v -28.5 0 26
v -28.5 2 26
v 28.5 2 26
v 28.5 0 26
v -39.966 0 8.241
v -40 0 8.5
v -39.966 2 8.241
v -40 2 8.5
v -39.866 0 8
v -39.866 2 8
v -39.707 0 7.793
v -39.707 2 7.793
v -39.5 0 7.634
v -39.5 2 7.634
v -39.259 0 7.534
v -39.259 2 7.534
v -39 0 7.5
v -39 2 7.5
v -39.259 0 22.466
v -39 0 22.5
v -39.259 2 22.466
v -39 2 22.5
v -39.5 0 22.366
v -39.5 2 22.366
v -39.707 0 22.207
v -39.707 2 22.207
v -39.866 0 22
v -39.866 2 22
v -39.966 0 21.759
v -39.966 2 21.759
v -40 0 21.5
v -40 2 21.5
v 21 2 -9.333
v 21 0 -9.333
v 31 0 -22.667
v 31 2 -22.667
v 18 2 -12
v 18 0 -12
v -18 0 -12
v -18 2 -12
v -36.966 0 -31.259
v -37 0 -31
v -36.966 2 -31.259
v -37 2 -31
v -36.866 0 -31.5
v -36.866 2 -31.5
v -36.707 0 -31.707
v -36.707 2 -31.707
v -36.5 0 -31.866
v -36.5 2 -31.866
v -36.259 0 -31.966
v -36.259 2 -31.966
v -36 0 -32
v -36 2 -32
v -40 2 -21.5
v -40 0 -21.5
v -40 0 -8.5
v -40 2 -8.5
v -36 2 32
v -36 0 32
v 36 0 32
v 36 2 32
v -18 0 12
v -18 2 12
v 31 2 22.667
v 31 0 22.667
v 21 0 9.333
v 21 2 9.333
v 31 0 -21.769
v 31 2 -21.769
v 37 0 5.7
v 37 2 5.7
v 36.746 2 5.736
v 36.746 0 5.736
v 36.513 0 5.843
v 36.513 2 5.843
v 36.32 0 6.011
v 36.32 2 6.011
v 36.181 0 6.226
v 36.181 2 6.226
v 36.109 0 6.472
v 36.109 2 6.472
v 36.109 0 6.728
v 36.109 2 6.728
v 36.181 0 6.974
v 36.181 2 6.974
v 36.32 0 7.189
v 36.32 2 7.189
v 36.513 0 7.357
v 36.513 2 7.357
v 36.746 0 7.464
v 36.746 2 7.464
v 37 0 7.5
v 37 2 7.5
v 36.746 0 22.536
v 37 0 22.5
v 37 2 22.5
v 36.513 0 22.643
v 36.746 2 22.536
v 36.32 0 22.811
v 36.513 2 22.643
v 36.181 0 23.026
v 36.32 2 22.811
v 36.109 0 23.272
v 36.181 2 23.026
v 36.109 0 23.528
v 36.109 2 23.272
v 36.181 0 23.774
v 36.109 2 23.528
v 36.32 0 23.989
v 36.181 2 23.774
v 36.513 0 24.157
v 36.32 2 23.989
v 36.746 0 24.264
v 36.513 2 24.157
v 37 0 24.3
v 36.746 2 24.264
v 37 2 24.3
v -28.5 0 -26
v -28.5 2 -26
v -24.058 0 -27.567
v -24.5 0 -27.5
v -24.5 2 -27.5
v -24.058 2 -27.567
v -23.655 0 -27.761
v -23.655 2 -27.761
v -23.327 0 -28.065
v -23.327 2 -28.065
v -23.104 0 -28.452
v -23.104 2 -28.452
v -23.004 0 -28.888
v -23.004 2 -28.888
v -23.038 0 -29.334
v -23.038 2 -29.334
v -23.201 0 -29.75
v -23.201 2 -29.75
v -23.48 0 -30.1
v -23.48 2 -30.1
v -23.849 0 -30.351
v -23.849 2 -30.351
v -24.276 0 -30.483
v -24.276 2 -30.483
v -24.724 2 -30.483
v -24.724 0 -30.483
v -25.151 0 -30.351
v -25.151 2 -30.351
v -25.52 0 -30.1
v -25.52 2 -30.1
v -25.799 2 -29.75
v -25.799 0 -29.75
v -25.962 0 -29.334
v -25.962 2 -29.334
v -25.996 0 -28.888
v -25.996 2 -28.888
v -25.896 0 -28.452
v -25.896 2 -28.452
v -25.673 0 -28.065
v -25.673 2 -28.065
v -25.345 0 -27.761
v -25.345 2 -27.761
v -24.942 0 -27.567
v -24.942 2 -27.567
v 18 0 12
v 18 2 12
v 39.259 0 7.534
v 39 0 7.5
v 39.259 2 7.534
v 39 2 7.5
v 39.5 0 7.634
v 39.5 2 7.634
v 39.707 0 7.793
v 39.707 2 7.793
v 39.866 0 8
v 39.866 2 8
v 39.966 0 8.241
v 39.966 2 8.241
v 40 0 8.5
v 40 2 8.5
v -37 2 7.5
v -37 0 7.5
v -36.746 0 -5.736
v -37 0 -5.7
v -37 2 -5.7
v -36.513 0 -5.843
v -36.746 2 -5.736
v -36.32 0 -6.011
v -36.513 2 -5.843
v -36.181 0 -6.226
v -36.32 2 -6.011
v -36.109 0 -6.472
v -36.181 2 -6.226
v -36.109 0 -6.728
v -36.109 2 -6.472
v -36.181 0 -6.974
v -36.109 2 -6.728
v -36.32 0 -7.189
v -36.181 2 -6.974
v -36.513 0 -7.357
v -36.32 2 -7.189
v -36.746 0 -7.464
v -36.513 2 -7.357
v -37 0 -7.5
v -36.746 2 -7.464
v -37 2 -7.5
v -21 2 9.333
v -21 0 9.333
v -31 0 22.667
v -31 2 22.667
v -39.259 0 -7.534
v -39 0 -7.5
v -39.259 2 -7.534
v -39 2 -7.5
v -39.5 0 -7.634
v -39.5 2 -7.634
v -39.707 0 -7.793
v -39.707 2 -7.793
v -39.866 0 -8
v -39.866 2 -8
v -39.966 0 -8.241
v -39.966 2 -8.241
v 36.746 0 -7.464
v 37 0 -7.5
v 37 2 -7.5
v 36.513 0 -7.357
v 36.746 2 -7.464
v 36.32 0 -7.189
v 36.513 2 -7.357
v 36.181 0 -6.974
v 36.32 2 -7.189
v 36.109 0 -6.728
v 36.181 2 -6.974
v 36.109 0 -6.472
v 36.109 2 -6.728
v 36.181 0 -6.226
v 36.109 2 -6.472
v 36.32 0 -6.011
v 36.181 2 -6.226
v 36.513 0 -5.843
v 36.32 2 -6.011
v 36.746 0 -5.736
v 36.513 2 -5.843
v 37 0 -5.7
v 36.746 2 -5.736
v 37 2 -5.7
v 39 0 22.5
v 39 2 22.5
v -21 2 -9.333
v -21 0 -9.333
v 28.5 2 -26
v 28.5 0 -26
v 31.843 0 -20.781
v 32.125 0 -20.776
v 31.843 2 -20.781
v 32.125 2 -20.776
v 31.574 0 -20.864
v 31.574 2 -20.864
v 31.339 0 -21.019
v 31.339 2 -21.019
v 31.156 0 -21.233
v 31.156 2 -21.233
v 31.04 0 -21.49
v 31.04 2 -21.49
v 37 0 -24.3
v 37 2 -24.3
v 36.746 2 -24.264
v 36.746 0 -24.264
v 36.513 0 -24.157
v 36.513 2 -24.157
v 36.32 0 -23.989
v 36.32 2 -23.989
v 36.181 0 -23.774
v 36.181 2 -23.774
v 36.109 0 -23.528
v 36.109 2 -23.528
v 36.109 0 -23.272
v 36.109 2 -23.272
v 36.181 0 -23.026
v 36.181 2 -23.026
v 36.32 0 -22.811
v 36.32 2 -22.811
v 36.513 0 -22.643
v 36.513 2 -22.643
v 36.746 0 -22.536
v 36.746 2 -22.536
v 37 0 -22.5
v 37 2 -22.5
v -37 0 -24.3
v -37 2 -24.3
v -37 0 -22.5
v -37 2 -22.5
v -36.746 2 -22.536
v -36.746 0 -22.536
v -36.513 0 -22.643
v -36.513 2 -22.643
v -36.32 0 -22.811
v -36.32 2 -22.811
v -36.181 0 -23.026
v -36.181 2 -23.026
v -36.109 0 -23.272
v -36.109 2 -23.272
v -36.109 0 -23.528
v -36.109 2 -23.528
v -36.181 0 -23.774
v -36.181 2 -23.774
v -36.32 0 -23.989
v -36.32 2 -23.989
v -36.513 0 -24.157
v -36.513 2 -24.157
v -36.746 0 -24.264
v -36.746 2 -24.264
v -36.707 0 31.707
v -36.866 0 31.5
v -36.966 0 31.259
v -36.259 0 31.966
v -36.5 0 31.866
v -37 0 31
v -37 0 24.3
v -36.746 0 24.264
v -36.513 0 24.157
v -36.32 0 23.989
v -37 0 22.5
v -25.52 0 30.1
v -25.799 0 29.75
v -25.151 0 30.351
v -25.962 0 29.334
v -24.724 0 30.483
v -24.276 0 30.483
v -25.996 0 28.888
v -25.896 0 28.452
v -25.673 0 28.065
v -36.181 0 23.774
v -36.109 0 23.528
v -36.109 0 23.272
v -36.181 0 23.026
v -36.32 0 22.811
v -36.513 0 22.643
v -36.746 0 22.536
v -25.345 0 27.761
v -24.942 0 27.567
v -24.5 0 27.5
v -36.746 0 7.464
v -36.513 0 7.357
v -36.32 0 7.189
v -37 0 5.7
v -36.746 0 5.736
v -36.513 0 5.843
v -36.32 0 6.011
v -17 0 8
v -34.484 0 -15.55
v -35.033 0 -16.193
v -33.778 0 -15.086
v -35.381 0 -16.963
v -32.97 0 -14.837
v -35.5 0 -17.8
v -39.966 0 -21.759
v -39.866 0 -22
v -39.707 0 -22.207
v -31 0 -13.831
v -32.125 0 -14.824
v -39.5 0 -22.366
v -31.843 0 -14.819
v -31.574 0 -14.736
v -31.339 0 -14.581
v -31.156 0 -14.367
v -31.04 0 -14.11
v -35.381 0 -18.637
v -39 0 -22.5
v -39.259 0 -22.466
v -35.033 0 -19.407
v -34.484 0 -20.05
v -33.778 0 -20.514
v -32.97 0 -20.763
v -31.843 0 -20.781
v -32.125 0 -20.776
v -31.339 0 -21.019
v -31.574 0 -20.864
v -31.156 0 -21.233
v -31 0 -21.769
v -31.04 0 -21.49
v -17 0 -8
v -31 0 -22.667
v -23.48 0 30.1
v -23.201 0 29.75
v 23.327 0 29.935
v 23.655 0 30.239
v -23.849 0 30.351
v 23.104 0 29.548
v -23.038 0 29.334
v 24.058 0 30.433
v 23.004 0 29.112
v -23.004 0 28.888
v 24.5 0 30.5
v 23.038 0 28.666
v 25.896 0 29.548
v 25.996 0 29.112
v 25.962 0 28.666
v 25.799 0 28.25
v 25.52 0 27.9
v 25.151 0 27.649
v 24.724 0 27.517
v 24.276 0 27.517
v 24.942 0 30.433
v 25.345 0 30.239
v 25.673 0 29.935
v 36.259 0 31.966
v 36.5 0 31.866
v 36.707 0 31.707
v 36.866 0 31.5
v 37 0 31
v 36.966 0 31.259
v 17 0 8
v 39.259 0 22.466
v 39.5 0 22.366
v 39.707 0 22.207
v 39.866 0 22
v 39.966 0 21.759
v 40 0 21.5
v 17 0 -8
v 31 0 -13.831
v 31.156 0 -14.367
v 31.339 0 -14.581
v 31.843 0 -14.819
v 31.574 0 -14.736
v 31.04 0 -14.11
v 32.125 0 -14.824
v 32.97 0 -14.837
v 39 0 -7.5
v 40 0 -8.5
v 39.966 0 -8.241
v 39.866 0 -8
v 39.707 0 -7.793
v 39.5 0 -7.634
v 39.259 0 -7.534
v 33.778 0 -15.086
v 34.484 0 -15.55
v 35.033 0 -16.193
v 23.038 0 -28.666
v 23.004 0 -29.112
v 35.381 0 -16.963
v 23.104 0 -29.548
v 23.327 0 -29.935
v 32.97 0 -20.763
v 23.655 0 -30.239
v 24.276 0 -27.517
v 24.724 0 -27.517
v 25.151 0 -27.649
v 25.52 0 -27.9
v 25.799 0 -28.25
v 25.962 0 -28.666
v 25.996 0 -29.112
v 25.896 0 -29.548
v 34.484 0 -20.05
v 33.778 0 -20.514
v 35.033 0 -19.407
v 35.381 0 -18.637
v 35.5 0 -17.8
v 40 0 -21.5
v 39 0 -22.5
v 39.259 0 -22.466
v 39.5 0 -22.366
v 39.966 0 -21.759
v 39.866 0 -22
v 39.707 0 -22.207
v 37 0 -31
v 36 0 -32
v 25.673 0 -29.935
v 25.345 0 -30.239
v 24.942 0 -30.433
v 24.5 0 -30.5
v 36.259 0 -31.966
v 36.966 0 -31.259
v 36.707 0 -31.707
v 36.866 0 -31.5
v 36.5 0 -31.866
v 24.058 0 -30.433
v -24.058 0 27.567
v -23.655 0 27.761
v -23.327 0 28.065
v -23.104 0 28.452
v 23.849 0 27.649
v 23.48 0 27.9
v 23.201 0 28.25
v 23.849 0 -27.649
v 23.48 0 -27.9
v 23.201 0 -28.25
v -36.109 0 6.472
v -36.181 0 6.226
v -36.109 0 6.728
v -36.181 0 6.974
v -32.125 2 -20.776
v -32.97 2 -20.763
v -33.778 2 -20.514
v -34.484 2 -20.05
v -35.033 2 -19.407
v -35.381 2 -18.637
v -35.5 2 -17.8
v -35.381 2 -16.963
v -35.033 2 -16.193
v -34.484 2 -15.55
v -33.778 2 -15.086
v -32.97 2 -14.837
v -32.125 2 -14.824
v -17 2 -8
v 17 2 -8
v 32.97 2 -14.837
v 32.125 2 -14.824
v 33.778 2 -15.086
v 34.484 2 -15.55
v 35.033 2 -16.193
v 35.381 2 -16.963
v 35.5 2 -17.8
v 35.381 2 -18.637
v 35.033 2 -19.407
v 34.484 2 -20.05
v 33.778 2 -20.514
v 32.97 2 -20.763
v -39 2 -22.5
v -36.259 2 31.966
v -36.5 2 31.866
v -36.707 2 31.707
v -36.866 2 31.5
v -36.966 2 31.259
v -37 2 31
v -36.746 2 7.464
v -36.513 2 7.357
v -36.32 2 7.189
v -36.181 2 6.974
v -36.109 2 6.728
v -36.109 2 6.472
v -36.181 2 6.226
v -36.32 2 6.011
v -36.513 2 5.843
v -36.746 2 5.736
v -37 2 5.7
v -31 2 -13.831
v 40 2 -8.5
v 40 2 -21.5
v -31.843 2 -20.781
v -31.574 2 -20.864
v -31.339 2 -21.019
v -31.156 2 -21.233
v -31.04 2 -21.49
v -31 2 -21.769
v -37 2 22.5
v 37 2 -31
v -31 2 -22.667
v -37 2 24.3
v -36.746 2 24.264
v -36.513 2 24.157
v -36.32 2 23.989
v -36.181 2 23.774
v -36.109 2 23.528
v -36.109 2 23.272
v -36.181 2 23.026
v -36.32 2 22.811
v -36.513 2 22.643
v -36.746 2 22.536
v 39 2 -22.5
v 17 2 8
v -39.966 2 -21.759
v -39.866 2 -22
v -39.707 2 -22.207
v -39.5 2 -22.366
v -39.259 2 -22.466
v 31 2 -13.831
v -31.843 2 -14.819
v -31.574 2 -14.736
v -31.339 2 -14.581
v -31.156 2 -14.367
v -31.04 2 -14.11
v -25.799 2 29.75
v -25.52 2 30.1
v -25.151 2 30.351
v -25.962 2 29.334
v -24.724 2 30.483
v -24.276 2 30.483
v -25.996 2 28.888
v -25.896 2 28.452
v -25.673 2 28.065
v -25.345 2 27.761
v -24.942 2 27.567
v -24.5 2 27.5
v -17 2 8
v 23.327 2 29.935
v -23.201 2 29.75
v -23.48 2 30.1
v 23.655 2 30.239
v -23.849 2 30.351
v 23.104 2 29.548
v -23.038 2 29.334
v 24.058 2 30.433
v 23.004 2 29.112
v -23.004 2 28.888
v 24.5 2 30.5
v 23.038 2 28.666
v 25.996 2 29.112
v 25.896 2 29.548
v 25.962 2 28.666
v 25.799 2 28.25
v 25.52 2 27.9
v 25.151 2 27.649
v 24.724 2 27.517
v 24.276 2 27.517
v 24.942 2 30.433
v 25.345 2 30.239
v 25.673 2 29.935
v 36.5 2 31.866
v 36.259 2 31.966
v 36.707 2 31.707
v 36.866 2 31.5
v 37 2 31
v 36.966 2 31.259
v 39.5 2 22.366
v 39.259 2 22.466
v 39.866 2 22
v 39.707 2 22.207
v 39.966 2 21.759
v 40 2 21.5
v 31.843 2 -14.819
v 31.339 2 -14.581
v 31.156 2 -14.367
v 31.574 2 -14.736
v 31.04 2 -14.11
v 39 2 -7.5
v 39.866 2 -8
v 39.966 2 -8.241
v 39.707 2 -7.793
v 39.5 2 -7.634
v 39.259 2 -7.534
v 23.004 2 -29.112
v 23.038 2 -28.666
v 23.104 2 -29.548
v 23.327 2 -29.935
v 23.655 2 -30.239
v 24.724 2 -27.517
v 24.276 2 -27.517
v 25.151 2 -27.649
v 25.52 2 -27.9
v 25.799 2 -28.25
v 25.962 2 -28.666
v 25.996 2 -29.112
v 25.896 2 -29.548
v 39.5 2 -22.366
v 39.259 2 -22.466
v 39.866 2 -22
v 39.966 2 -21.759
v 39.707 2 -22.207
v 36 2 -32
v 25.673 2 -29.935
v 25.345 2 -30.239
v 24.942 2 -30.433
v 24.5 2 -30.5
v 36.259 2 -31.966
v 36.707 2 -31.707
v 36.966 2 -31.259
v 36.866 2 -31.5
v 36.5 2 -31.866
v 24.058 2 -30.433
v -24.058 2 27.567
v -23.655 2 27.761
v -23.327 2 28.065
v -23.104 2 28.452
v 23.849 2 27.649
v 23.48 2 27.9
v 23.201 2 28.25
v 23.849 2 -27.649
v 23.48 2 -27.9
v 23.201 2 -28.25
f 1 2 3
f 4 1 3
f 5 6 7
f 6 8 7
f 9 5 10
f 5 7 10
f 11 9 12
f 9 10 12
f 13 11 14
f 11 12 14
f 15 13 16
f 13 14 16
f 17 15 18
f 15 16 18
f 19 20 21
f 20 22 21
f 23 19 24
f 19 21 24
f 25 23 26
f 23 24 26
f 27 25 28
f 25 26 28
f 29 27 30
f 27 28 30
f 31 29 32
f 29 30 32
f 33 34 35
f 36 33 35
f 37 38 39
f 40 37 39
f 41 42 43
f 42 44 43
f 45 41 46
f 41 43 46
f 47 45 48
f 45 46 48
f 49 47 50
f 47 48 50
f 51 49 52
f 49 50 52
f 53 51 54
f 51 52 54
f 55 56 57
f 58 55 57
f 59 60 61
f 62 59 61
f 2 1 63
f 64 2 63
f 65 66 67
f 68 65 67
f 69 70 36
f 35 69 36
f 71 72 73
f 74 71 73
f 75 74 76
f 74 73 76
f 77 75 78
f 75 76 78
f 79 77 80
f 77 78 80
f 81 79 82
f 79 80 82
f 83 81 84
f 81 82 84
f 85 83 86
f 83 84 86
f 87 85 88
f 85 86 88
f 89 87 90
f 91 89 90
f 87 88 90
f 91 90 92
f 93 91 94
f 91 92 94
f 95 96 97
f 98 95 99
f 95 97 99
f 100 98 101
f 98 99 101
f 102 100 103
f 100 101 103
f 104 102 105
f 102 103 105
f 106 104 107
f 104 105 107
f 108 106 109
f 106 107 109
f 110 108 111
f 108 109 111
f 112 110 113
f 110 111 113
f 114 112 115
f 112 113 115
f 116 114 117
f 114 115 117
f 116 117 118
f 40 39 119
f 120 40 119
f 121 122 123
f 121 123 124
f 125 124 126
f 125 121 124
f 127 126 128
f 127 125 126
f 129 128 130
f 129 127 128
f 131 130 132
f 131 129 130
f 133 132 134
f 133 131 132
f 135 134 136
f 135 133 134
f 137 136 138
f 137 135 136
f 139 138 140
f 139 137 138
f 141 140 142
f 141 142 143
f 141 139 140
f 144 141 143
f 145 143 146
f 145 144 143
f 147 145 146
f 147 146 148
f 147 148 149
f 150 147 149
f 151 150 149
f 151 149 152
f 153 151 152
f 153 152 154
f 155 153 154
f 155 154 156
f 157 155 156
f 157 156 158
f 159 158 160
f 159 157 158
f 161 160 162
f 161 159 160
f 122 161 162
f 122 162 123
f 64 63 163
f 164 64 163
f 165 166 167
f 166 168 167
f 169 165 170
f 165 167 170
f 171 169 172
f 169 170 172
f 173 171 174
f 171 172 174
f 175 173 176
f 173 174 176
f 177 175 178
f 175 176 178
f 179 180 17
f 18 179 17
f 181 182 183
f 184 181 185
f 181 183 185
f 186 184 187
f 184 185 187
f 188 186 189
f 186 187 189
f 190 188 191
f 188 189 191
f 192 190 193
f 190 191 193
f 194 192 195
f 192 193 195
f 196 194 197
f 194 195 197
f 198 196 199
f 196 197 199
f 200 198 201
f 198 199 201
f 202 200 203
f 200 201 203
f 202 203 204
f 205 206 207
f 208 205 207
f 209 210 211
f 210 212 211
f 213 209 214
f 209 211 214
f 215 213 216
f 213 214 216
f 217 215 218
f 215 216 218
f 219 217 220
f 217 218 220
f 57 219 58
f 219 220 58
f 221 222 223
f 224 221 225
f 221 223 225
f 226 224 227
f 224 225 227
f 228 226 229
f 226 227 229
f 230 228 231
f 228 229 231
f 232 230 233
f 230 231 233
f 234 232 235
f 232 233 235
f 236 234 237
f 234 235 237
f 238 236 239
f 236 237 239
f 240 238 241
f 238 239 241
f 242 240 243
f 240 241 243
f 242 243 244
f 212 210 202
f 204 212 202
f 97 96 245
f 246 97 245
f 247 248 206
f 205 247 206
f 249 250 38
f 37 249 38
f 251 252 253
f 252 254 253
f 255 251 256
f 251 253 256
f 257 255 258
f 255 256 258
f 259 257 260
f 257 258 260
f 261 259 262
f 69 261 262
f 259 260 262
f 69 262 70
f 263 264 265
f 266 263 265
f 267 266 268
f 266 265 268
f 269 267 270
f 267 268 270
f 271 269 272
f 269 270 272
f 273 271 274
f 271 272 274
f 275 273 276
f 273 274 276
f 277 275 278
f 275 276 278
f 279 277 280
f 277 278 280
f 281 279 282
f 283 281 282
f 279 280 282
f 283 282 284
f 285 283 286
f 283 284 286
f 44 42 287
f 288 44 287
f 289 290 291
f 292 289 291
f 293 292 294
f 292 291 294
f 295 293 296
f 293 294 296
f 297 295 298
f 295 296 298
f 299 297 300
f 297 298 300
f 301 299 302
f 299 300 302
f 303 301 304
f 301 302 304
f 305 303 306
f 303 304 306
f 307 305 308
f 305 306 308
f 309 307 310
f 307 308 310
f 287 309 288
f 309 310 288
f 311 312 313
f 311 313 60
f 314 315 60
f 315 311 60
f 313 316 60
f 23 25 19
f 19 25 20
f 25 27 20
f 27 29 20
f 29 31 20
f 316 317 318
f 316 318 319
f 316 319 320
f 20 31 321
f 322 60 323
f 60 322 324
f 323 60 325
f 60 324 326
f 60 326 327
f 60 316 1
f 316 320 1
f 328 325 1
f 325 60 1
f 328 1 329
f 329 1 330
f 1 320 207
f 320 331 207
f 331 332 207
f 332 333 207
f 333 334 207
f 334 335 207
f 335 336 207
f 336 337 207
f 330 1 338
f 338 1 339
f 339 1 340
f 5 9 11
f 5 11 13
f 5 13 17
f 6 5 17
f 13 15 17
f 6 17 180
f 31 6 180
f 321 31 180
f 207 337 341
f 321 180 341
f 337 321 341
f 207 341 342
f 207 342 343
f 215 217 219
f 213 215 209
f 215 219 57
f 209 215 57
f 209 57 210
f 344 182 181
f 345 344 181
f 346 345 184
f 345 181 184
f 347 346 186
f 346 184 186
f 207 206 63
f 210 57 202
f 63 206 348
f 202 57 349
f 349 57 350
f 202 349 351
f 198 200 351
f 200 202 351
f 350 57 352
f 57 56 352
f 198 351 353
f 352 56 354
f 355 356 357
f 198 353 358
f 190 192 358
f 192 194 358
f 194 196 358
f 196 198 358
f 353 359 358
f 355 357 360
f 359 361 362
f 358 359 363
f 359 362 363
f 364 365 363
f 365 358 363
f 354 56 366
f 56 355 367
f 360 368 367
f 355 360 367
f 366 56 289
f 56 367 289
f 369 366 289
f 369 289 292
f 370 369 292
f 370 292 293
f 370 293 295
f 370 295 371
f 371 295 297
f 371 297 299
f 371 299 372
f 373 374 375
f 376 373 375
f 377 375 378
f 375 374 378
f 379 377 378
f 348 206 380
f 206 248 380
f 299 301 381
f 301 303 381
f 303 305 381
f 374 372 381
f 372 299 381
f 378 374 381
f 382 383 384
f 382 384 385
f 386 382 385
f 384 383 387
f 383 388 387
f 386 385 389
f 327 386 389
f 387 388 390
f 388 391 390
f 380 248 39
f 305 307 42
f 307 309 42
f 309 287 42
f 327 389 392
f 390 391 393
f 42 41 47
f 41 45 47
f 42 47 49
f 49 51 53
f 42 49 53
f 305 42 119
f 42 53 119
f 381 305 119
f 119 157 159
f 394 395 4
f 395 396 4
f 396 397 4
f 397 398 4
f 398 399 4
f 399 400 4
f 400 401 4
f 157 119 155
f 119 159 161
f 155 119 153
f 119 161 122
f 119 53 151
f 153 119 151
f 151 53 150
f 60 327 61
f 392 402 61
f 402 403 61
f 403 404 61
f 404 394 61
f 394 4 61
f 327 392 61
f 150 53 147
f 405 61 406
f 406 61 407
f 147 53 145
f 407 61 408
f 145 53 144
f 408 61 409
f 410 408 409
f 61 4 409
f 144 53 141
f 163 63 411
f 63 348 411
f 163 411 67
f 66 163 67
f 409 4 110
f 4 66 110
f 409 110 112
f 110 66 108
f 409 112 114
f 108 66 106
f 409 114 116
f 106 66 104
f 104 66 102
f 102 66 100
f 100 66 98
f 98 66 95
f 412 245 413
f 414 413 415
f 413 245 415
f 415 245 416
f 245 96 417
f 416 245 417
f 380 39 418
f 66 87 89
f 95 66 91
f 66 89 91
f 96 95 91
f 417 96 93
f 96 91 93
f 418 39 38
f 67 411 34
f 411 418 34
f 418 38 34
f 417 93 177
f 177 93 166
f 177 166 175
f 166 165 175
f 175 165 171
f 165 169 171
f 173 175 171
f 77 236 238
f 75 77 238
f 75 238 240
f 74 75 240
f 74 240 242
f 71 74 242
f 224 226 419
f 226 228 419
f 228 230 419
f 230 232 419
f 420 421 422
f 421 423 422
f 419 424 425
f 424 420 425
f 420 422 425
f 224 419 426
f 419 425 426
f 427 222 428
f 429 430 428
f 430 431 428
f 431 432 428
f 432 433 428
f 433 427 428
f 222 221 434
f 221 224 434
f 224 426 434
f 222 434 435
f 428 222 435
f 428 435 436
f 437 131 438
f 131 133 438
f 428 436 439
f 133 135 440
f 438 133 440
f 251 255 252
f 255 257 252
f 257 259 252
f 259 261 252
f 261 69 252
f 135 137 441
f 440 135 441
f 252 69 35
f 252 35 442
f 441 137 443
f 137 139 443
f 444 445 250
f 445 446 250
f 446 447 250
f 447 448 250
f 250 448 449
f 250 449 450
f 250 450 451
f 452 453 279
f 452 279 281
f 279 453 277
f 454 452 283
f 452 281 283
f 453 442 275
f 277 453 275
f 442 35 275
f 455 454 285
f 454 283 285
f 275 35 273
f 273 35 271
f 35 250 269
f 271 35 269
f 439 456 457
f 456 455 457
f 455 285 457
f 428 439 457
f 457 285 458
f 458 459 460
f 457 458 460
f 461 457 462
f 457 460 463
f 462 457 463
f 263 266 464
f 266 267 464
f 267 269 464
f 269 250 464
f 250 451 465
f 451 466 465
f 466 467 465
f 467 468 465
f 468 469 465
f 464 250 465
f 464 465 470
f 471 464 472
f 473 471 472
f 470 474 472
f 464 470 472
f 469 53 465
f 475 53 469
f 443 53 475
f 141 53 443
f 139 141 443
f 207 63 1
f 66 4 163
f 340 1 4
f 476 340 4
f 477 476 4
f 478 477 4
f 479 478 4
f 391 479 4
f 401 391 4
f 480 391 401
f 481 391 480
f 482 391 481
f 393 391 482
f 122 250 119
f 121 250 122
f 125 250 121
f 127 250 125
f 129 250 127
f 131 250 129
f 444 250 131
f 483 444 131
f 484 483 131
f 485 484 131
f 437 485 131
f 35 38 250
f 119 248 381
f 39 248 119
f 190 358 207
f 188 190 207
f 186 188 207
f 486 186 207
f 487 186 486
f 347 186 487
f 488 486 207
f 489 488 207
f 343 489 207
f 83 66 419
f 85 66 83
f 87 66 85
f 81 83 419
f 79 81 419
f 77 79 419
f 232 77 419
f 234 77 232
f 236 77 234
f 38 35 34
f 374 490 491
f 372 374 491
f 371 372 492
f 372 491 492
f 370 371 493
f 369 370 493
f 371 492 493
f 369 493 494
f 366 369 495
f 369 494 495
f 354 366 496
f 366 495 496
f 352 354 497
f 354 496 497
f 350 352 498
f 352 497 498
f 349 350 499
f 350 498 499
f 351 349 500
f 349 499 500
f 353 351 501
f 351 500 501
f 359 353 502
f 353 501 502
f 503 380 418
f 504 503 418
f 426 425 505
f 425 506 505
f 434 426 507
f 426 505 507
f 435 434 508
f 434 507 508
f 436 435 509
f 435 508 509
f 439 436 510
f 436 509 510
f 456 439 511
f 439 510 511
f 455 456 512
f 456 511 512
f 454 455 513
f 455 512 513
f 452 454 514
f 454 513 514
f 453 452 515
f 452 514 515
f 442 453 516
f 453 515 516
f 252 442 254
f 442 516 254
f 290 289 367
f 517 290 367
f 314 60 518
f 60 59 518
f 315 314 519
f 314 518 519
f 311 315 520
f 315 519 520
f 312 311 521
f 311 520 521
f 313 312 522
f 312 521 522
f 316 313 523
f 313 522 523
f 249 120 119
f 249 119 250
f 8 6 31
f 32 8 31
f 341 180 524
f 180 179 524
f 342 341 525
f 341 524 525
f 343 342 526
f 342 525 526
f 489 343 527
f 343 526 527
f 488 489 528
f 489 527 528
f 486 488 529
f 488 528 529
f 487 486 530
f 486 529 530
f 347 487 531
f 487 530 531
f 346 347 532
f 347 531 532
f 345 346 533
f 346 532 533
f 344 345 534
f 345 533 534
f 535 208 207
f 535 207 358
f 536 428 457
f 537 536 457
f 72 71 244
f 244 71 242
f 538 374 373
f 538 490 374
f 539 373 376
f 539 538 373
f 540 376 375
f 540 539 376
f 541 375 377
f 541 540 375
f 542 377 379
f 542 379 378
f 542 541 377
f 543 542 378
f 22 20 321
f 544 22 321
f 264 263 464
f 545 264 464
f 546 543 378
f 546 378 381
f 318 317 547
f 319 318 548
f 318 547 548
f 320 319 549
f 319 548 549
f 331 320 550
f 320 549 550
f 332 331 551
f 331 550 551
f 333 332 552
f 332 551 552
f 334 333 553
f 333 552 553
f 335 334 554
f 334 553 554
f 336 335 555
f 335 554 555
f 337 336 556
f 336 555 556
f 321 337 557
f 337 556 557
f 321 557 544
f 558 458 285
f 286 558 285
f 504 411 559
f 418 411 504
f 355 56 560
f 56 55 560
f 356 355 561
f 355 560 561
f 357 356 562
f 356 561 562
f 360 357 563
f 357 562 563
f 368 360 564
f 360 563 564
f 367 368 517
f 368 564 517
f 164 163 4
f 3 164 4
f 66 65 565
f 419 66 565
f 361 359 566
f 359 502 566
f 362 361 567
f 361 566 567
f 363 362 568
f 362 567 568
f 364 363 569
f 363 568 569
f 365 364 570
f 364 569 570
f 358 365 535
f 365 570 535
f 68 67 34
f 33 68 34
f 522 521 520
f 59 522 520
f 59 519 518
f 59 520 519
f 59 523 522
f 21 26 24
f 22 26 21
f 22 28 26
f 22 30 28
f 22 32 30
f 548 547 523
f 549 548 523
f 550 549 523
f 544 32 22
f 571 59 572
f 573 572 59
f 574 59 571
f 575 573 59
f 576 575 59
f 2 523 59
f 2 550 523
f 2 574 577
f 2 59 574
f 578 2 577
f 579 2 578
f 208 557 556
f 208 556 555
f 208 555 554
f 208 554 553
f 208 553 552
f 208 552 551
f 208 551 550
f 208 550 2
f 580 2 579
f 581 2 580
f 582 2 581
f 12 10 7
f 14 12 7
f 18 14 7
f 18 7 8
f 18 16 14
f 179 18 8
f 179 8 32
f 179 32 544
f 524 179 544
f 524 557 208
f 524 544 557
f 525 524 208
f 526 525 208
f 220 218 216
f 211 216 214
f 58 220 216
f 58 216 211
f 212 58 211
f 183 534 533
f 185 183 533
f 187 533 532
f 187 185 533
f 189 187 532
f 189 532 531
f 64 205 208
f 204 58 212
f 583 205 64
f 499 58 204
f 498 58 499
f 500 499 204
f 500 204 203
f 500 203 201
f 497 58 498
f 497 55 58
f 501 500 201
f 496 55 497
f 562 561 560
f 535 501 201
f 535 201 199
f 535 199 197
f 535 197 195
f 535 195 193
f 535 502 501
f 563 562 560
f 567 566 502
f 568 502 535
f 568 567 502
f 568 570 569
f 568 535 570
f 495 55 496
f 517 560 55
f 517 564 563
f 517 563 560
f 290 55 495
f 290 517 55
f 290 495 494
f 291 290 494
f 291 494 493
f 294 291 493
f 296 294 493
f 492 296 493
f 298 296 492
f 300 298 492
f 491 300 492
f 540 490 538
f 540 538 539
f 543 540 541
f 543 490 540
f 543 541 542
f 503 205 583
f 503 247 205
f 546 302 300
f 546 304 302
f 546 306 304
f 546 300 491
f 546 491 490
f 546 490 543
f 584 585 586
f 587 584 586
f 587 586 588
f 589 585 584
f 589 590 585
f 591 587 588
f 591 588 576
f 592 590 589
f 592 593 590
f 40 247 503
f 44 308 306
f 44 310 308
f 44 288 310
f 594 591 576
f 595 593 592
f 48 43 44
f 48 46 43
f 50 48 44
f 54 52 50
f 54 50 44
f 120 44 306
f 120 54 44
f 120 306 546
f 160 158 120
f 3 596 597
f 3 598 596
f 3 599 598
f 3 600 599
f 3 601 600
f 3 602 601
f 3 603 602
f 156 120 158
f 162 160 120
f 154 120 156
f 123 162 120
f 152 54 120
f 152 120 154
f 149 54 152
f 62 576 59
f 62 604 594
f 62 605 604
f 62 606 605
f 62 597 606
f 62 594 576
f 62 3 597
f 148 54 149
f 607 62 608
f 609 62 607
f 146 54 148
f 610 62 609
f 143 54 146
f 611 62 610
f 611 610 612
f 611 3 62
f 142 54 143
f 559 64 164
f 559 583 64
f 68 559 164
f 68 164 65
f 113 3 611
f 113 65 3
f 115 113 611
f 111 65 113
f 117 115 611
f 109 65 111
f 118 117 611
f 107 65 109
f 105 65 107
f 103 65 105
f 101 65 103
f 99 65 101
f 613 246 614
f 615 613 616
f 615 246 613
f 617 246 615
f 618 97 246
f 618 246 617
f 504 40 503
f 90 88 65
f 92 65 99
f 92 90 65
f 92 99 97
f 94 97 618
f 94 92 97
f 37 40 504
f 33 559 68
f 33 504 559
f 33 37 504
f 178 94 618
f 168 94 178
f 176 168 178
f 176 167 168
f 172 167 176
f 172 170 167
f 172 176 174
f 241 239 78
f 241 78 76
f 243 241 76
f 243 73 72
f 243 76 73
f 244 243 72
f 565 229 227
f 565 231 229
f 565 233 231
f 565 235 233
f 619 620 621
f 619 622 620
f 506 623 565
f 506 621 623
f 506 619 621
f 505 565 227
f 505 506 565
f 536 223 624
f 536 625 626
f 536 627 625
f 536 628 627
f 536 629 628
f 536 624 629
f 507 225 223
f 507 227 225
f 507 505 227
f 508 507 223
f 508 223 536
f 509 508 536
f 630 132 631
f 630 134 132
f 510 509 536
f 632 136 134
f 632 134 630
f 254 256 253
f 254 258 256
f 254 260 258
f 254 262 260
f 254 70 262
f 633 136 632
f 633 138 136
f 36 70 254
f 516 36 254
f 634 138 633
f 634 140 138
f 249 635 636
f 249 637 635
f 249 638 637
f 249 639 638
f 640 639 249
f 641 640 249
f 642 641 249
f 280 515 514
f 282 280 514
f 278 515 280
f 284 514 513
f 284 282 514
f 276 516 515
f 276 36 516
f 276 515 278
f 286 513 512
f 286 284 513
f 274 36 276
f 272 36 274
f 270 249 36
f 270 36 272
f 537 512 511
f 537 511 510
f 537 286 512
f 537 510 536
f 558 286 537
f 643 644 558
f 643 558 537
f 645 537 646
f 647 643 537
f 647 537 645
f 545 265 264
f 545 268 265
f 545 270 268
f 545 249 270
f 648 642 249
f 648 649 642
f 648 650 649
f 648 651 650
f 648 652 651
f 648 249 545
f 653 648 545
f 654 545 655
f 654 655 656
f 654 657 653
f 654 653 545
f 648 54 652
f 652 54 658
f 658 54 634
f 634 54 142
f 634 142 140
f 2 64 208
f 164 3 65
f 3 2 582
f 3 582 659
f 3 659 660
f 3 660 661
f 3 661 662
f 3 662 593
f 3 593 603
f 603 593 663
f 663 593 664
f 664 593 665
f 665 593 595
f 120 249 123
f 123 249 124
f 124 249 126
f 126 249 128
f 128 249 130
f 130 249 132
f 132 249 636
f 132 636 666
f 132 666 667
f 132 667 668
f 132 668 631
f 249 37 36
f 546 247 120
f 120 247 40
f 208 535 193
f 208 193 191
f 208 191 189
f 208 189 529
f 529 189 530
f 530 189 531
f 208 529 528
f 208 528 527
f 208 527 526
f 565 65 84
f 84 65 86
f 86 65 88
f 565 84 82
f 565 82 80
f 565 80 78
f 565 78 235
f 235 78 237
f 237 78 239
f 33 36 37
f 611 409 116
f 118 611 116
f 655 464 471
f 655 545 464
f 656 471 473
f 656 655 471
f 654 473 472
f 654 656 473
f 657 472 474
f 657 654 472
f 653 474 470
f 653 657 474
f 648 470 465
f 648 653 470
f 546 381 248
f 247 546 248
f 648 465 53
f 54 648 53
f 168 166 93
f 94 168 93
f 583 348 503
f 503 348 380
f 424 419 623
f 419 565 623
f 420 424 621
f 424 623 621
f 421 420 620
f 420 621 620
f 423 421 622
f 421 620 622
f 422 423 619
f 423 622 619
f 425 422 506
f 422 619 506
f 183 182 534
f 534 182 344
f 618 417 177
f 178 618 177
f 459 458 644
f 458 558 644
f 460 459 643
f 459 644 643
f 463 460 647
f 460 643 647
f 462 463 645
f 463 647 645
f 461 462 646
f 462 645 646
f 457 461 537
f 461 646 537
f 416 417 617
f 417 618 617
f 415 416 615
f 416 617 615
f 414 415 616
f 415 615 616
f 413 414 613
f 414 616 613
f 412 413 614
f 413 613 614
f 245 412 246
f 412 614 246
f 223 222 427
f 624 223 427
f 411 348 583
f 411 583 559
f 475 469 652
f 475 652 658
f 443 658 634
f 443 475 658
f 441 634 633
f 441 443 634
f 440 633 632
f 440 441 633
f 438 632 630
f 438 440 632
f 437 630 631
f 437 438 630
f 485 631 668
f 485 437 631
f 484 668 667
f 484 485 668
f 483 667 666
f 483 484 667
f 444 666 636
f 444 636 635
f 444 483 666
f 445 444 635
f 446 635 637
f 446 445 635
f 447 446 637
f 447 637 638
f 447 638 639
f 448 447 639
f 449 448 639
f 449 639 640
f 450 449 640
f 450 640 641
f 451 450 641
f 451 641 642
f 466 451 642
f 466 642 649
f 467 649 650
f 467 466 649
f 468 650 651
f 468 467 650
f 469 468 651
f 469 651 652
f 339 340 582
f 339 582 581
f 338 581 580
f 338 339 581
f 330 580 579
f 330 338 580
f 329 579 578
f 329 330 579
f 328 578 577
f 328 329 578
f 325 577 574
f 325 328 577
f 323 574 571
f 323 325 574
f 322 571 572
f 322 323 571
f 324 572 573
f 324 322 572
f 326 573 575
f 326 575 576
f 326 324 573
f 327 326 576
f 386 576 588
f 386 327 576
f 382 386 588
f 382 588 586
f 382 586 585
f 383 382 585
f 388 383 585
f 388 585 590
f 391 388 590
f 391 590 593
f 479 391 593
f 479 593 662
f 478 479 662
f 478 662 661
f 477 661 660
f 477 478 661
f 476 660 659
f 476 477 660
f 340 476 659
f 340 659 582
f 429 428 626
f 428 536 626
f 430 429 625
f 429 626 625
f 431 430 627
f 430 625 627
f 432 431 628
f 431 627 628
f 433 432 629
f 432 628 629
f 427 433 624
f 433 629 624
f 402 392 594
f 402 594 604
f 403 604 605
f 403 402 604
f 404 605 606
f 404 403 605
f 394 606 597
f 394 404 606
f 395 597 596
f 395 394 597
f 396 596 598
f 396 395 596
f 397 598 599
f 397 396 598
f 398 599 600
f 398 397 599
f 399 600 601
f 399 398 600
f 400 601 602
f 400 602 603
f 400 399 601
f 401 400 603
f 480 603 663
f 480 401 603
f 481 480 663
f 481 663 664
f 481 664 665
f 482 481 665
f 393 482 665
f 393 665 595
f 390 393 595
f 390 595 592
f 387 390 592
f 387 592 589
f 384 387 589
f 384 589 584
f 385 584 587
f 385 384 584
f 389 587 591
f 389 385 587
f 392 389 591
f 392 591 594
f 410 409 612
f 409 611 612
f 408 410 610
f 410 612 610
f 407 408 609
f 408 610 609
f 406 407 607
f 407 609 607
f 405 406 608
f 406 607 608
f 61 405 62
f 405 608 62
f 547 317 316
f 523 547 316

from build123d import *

# Parameters (mm, degrees)
SKETCH_1_R            = 1.5
EXTRUDE_1_DEPTH       = 2
SKETCH_2_R            = 0.9
SKETCH_2_W            = 62
SKETCH_2_H            = 52
CUT_EXTRUDE_1_DEPTH   = 52.264022472
EXTRUDE_START         = -2
EXTRUDE_1_2_OUTLINE_W = 34
EXTRUDE_1_2_OUTLINE_H = 16
EXTRUDE_1_2_DEPTH     = 2
SKETCH_4_R            = 3
CUT_EXTRUDE_2_DEPTH   = 52.264022472
FILLET_1_R            = 1


# Read off the part's stored shape, not the designer's step: 拉伸-薄壁1
with BuildPart() as part:
    # 草图1 → Extrude 1 (new body)
    with BuildSketch(Plane(origin=(0, 0, 0), x_dir=(1, 0, 0), z_dir=(0, 1, 0))):
        Polygon((-37, 32), (-37, 22.5), (-40, 22.5), (-40, 7.5), (-37, 7.5), (-37, -7.5), (-40, -7.5), (-40, -22.5), (-37, -22.5), (-37, -32), (37, -32), (37, -22.5), (40, -22.5), (40, -7.5), (37, -7.5), (37, 7.5), (40, 7.5), (40, 22.5), (37, 22.5), (37, 32), align=None)
        with Locations(Location((-24.5, 29, 0), (0, 0, 270))):
            Circle(SKETCH_1_R, mode=Mode.SUBTRACT)
        with Locations(Location((24.5, 29, 0), (0, 0, 90))):
            Circle(SKETCH_1_R, mode=Mode.SUBTRACT)
        with Locations(Location((24.5, -29, 0), (0, 0, 270))):
            Circle(SKETCH_1_R, mode=Mode.SUBTRACT)
        with Locations(Location((-24.5, -29, 0), (0, 0, 90))):
            Circle(SKETCH_1_R, mode=Mode.SUBTRACT)
    extrude(amount=EXTRUDE_1_DEPTH)

    # 草图2 → 切除-拉伸1 (cut, through all)
    with BuildSketch(Plane(origin=(0, 2, 0), x_dir=(1, 0, 0), z_dir=(0, 1, 0))):
        with Locations((-37, 23.4)):
            Circle(SKETCH_2_R)
        with Locations((-37, 6.6)):
            Circle(SKETCH_2_R)
        with Locations((37, 6.6)):
            Circle(SKETCH_2_R)
        with Locations((37, 23.4)):
            Circle(SKETCH_2_R)
        with Locations((37, -23.4)):
            Circle(SKETCH_2_R)
        with Locations((-37, -23.4)):
            Circle(SKETCH_2_R)
        with Locations((37, -6.6)):
            Circle(SKETCH_2_R)
        with Locations((-37, -6.6)):
            Circle(SKETCH_2_R)
        Rectangle(SKETCH_2_W, SKETCH_2_H)
    extrude(amount=-CUT_EXTRUDE_1_DEPTH, mode=Mode.SUBTRACT)

    # Extrude 1 2 outline → Extrude 1 2 (add)
    with BuildSketch(Plane(origin=(0, 2, 0), x_dir=(1, 0, 0), z_dir=(0, 1, 0)).offset(EXTRUDE_START)):
        Polygon((-31, 26), (-31, 22.666666667), (-21, 9.333333333), (-21, -9.333333333), (-31, -22.666666667), (-31, -26), (-28.5, -26), (-18, -12), (18, -12), (28.5, -26), (31, -26), (31, -22.666666667), (21, -9.333333333), (21, 9.333333333), (31, 22.666666667), (31, 26), (28.5, 26), (18, 12), (-18, 12), (-28.5, 26), align=None)
        Rectangle(EXTRUDE_1_2_OUTLINE_W, EXTRUDE_1_2_OUTLINE_H, mode=Mode.SUBTRACT)
    extrude(amount=EXTRUDE_1_2_DEPTH)

    # 草图4 → 切除-拉伸2 (cut, through all)
    with BuildSketch(Plane(origin=(0, 2, 0), x_dir=(1, 0, 0), z_dir=(0, 1, 0))):
        with Locations((-32.5, 17.8)):
            Circle(SKETCH_4_R)
        with Locations((32.5, 17.8)):
            Circle(SKETCH_4_R)
    extrude(amount=-CUT_EXTRUDE_2_DEPTH, mode=Mode.SUBTRACT)

    # 圆角1
    fillet_1_edges = [part.edges().sort_by_distance(p)[0] for p in [
        (-31, 1, -15.201923789),
        (-31, 1, -20.398076211),
        (31, 1, -20.398076211),
        (31, 1, -15.201923789),
        (37, 1, -32),
        (40, 1, -22.5),
        (40, 1, -7.5),
        (40, 1, 7.5),
        (40, 1, 22.5),
        (37, 1, 32),
        (-37, 1, 32),
        (-40, 1, 22.5),
        (-40, 1, 7.5),
        (-40, 1, -7.5),
        (-40, 1, -22.5),
        (-37, 1, -32),
    ]]
    fillet(fillet_1_edges, radius=FILLET_1_R)


solid = part.part
